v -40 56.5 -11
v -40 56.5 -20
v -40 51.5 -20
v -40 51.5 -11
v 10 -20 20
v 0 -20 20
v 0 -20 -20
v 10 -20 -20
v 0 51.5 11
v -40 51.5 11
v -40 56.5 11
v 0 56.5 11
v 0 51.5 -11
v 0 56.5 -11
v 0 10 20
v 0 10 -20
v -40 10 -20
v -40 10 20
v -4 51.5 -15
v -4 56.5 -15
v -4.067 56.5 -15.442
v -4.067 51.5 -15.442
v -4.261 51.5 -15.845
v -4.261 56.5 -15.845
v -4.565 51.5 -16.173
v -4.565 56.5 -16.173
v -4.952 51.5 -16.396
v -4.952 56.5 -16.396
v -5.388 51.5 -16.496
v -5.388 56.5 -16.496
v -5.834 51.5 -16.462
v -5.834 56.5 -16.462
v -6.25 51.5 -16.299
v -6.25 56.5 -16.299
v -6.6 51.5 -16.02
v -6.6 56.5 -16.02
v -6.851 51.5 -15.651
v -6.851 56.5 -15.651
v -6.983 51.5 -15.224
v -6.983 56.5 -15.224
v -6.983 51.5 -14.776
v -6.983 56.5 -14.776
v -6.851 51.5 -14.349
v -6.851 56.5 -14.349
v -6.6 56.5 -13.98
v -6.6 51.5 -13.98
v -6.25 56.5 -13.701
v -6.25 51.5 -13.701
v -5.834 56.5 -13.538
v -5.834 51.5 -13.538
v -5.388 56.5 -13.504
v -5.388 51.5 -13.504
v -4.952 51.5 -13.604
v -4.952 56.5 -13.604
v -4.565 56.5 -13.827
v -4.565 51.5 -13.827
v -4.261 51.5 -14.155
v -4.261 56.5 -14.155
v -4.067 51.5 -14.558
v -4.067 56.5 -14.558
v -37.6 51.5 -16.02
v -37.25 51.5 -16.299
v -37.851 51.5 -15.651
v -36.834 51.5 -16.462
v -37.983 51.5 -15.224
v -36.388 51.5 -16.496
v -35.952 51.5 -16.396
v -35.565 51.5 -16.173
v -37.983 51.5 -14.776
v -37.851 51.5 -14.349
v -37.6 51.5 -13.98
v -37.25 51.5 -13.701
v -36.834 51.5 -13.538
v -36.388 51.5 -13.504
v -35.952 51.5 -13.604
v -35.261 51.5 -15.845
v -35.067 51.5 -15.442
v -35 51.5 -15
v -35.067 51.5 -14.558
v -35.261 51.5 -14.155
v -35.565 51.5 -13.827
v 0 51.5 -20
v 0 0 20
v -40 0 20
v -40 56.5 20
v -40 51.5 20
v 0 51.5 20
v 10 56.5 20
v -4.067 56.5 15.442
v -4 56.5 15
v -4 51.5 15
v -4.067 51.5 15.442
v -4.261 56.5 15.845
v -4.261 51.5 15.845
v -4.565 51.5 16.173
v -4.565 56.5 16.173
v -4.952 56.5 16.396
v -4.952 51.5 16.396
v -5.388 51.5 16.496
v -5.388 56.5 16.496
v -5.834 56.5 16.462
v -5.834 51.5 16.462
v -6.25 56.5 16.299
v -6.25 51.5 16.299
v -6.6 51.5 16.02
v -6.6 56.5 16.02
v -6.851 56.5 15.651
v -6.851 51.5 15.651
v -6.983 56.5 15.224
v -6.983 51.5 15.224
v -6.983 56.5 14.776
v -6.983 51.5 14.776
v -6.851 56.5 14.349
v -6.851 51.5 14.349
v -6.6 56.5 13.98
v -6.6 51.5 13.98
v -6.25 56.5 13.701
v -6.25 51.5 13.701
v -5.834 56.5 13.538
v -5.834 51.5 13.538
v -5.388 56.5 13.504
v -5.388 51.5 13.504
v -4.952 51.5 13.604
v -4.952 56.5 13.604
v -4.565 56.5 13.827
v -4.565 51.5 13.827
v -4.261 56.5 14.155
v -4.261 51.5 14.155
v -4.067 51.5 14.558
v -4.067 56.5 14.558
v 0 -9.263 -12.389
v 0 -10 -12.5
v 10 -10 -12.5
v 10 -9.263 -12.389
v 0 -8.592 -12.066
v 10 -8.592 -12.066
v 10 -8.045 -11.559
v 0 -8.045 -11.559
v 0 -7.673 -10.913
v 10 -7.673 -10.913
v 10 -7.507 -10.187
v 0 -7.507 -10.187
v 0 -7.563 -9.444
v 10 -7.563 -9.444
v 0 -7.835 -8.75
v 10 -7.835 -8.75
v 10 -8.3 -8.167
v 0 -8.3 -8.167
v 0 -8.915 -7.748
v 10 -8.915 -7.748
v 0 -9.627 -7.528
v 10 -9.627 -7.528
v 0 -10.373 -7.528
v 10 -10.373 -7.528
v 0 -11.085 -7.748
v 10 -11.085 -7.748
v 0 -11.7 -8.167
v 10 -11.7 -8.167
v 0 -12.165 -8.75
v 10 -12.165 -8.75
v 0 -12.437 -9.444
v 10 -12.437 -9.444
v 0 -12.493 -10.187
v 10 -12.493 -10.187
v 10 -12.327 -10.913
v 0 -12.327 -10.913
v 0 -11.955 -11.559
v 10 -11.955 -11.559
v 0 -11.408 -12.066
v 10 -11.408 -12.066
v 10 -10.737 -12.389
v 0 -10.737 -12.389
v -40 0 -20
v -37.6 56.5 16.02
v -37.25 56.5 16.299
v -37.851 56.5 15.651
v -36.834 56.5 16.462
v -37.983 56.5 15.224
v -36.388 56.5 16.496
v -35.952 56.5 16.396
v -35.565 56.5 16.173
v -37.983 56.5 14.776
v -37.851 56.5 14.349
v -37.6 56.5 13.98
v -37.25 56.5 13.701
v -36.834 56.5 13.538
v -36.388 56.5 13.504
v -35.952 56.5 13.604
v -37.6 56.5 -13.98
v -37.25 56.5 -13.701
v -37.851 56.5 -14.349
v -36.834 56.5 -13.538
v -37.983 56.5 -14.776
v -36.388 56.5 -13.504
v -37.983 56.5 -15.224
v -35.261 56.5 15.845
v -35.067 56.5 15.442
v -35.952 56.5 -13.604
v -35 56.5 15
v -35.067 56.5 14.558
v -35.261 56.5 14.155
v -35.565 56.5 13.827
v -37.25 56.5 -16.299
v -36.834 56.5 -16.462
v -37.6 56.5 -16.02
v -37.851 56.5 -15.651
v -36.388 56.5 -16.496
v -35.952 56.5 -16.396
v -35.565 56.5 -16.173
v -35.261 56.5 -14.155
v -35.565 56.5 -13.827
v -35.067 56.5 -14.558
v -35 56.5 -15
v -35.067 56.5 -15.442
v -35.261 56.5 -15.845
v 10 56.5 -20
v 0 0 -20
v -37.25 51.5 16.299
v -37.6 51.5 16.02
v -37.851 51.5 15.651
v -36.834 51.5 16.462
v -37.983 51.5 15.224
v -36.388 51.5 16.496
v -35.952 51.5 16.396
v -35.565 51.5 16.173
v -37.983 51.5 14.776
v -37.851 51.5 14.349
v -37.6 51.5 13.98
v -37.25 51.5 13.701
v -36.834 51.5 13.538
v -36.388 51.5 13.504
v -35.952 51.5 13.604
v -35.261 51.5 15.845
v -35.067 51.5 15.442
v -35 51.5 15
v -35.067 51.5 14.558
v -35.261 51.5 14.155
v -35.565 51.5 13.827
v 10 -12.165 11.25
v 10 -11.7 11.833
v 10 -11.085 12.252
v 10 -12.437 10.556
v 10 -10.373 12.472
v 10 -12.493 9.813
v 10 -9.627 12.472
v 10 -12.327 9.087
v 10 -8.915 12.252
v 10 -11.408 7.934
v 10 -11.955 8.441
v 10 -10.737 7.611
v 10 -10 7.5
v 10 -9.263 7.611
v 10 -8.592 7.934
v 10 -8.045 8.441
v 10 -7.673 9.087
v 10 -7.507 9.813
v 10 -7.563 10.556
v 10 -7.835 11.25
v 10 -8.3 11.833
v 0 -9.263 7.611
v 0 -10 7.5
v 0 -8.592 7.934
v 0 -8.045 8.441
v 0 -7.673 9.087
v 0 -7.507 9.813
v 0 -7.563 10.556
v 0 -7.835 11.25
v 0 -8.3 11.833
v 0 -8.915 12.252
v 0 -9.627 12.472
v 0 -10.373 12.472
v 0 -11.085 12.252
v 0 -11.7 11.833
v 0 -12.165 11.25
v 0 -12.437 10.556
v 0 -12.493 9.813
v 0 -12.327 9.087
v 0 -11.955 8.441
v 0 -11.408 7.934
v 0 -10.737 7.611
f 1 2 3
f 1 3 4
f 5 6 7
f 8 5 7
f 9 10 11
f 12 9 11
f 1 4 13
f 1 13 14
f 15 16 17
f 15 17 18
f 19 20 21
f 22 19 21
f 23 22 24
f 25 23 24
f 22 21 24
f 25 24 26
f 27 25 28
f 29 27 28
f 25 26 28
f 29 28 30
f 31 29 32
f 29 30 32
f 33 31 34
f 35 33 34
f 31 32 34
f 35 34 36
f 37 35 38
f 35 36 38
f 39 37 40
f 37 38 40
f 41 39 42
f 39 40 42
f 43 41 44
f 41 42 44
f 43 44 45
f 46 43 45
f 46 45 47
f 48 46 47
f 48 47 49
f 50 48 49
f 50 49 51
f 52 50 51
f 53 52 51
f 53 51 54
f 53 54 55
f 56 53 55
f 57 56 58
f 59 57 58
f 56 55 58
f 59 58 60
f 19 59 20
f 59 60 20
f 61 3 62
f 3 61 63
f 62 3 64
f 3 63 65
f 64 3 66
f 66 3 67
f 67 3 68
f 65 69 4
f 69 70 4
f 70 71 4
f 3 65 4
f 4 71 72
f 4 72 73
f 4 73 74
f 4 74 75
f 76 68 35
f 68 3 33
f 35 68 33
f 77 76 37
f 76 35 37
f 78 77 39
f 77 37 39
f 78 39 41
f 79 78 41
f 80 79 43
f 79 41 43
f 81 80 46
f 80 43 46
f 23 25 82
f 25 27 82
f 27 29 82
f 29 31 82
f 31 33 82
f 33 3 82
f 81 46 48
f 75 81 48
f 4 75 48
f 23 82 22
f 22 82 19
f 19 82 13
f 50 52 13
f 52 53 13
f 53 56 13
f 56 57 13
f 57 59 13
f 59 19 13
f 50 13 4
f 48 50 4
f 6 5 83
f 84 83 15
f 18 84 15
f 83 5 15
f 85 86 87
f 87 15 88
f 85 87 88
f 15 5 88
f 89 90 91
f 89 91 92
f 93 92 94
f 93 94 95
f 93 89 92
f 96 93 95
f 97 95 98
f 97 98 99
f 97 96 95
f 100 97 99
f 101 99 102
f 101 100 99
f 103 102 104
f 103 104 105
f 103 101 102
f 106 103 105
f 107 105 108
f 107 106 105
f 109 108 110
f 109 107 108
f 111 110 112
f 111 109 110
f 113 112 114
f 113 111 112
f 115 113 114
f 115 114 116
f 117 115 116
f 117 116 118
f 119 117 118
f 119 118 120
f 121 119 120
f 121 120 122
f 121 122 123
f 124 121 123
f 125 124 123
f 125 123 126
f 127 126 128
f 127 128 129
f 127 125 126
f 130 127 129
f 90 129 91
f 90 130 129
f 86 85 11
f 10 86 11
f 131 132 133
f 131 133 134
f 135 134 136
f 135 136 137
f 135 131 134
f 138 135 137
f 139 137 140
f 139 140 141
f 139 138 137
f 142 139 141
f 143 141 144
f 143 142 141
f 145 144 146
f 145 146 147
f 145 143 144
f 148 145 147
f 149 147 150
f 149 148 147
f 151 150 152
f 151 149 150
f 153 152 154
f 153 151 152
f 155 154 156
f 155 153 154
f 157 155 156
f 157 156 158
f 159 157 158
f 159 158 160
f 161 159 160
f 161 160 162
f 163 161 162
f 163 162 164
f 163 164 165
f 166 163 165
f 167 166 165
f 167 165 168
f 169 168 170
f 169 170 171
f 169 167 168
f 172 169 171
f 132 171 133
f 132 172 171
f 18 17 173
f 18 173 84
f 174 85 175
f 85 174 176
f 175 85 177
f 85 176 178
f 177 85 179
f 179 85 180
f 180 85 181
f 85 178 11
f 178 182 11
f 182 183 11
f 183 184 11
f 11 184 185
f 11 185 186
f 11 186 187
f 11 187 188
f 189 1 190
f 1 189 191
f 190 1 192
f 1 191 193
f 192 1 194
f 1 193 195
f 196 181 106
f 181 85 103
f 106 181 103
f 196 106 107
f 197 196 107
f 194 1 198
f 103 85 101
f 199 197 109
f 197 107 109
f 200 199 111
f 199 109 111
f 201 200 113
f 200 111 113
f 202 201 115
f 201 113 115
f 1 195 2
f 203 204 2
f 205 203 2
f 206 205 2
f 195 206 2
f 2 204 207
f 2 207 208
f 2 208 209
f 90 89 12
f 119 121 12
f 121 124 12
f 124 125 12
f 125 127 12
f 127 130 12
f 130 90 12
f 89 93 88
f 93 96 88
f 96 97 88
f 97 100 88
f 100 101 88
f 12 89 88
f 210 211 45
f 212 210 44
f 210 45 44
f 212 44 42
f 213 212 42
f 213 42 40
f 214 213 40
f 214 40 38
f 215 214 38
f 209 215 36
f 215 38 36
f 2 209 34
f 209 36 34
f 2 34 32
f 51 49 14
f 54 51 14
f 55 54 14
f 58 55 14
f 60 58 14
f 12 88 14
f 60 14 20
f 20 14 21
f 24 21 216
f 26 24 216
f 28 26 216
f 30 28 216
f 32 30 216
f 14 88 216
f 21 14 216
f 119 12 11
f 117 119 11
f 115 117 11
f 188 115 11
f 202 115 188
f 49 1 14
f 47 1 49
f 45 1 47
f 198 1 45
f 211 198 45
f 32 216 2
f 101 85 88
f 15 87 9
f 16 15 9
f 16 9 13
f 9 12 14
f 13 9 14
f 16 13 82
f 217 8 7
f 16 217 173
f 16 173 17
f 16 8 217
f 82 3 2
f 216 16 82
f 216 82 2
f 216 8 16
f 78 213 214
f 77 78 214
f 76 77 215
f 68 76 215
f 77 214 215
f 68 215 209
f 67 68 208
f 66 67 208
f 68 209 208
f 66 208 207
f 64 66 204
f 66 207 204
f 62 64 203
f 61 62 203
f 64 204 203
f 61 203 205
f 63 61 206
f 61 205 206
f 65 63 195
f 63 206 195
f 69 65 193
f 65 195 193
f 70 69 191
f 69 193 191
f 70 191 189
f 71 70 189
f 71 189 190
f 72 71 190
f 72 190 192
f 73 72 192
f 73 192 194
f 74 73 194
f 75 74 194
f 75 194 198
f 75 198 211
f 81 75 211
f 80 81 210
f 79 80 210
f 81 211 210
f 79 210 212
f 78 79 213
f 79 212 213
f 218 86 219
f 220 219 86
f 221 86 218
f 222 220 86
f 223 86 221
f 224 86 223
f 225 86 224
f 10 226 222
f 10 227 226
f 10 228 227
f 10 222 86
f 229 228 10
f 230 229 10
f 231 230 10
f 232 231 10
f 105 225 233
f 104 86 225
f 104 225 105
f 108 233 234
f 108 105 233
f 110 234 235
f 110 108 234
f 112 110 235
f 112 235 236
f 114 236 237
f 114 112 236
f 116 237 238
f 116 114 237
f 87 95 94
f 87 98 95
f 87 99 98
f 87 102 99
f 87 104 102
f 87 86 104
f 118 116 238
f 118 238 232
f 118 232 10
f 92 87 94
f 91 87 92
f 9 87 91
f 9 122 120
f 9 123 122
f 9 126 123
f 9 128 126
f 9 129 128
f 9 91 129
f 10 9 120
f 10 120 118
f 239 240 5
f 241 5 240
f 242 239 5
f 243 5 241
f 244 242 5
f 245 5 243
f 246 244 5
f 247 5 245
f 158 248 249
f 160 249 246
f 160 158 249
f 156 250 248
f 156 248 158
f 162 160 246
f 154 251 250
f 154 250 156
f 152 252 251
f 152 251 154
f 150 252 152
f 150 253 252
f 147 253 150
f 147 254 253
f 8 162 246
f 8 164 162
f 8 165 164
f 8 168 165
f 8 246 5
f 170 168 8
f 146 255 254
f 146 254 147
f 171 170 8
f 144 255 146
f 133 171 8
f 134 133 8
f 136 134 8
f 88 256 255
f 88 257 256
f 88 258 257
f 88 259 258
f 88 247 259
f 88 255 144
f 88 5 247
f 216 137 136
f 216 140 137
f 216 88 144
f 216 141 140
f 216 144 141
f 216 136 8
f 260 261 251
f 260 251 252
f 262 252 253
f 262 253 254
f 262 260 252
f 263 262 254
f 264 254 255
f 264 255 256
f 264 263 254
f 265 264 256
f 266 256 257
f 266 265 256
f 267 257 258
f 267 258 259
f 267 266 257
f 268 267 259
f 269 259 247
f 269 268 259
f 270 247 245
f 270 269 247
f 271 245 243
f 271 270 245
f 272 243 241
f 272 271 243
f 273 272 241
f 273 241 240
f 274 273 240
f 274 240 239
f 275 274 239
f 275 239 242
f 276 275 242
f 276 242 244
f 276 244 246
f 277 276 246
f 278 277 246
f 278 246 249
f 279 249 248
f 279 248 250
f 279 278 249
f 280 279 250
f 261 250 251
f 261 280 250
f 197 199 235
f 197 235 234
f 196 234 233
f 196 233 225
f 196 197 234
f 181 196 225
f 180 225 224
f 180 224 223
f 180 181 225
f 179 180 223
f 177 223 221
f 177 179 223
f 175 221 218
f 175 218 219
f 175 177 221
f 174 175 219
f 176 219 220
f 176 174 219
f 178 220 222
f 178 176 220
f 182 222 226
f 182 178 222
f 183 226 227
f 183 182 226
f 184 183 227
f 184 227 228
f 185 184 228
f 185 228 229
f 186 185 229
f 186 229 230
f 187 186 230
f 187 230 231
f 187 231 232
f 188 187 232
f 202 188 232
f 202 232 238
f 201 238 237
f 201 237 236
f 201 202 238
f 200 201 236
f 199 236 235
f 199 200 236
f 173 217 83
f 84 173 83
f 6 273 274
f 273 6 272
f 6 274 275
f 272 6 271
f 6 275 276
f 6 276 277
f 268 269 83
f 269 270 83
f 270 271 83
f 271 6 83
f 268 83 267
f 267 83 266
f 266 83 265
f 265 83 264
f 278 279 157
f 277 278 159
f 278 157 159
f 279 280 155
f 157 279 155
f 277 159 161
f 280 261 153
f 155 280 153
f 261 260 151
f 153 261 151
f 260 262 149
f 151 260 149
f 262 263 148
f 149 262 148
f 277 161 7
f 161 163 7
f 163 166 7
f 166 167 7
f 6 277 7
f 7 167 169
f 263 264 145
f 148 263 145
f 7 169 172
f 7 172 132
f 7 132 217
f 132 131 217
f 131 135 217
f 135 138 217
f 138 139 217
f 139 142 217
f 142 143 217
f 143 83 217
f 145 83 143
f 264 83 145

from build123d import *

# Parameters (mm, degrees)
SKETCH1_W           = 40
SKETCH1_H           = 56.5
SKETCH1_H_2         = 20
SKETCH1_R           = 2.5
BOSS_EXTRUDE1_DEPTH = 10
SKETCH3_W           = 40
SKETCH3_H           = 10
BOSS_EXTRUDE2_DEPTH = 40
SKETCH4_W           = 9
SKETCH4_H           = 5
BOSS_EXTRUDE3_DEPTH = 40
SKETCH5_R           = 1.5
CUT_EXTRUDE1_DEPTH  = 5


with BuildPart() as part:
    # Sketch1 → Boss-Extrude1 (new body)
    with BuildSketch(Plane(origin=(0, 0, 0), x_dir=(0, 0, -1), z_dir=(1, 0, 0))):
        with Locations((0, 28.25)):
            Rectangle(SKETCH1_W, SKETCH1_H)
        with Locations((0, -10)):
            Rectangle(SKETCH1_W, SKETCH1_H_2)
        with Locations((10, -10)):
            Circle(SKETCH1_R, mode=Mode.SUBTRACT)
        with Locations((-10, -10)):
            Circle(SKETCH1_R, mode=Mode.SUBTRACT)
    extrude(amount=BOSS_EXTRUDE1_DEPTH)

    # Sketch3 → Boss-Extrude2 (add)
    with BuildSketch(Plane.ZY):
        with Locations((0, 5)):
            Rectangle(SKETCH3_W, SKETCH3_H)
    extrude(amount=BOSS_EXTRUDE2_DEPTH)

    # Sketch4 → Boss-Extrude3 (add)
    with BuildSketch(Plane.ZY):
        with Locations((-15.5, 54)):
            Rectangle(SKETCH4_W, SKETCH4_H)
    boss_extrude3 = extrude(amount=BOSS_EXTRUDE3_DEPTH)

    # Sketch5 → Cut-Extrude1 (cut)
    with BuildSketch(Plane(origin=(0, 56.5, 0), x_dir=(1, 0, 0), z_dir=(0, 1, 0))):
        with Locations((-36.5, 15)):
            Circle(SKETCH5_R)
        with Locations((-5.5, 15)):
            Circle(SKETCH5_R)
    cut_extrude1 = extrude(amount=-CUT_EXTRUDE1_DEPTH, mode=Mode.SUBTRACT)

    # Mirror2: Boss-Extrude3, Cut-Extrude1 across plane
    add(boss_extrude3.mirror(Plane.XY))
    add(cut_extrude1.mirror(Plane.XY), mode=Mode.SUBTRACT)


solid = part.part
